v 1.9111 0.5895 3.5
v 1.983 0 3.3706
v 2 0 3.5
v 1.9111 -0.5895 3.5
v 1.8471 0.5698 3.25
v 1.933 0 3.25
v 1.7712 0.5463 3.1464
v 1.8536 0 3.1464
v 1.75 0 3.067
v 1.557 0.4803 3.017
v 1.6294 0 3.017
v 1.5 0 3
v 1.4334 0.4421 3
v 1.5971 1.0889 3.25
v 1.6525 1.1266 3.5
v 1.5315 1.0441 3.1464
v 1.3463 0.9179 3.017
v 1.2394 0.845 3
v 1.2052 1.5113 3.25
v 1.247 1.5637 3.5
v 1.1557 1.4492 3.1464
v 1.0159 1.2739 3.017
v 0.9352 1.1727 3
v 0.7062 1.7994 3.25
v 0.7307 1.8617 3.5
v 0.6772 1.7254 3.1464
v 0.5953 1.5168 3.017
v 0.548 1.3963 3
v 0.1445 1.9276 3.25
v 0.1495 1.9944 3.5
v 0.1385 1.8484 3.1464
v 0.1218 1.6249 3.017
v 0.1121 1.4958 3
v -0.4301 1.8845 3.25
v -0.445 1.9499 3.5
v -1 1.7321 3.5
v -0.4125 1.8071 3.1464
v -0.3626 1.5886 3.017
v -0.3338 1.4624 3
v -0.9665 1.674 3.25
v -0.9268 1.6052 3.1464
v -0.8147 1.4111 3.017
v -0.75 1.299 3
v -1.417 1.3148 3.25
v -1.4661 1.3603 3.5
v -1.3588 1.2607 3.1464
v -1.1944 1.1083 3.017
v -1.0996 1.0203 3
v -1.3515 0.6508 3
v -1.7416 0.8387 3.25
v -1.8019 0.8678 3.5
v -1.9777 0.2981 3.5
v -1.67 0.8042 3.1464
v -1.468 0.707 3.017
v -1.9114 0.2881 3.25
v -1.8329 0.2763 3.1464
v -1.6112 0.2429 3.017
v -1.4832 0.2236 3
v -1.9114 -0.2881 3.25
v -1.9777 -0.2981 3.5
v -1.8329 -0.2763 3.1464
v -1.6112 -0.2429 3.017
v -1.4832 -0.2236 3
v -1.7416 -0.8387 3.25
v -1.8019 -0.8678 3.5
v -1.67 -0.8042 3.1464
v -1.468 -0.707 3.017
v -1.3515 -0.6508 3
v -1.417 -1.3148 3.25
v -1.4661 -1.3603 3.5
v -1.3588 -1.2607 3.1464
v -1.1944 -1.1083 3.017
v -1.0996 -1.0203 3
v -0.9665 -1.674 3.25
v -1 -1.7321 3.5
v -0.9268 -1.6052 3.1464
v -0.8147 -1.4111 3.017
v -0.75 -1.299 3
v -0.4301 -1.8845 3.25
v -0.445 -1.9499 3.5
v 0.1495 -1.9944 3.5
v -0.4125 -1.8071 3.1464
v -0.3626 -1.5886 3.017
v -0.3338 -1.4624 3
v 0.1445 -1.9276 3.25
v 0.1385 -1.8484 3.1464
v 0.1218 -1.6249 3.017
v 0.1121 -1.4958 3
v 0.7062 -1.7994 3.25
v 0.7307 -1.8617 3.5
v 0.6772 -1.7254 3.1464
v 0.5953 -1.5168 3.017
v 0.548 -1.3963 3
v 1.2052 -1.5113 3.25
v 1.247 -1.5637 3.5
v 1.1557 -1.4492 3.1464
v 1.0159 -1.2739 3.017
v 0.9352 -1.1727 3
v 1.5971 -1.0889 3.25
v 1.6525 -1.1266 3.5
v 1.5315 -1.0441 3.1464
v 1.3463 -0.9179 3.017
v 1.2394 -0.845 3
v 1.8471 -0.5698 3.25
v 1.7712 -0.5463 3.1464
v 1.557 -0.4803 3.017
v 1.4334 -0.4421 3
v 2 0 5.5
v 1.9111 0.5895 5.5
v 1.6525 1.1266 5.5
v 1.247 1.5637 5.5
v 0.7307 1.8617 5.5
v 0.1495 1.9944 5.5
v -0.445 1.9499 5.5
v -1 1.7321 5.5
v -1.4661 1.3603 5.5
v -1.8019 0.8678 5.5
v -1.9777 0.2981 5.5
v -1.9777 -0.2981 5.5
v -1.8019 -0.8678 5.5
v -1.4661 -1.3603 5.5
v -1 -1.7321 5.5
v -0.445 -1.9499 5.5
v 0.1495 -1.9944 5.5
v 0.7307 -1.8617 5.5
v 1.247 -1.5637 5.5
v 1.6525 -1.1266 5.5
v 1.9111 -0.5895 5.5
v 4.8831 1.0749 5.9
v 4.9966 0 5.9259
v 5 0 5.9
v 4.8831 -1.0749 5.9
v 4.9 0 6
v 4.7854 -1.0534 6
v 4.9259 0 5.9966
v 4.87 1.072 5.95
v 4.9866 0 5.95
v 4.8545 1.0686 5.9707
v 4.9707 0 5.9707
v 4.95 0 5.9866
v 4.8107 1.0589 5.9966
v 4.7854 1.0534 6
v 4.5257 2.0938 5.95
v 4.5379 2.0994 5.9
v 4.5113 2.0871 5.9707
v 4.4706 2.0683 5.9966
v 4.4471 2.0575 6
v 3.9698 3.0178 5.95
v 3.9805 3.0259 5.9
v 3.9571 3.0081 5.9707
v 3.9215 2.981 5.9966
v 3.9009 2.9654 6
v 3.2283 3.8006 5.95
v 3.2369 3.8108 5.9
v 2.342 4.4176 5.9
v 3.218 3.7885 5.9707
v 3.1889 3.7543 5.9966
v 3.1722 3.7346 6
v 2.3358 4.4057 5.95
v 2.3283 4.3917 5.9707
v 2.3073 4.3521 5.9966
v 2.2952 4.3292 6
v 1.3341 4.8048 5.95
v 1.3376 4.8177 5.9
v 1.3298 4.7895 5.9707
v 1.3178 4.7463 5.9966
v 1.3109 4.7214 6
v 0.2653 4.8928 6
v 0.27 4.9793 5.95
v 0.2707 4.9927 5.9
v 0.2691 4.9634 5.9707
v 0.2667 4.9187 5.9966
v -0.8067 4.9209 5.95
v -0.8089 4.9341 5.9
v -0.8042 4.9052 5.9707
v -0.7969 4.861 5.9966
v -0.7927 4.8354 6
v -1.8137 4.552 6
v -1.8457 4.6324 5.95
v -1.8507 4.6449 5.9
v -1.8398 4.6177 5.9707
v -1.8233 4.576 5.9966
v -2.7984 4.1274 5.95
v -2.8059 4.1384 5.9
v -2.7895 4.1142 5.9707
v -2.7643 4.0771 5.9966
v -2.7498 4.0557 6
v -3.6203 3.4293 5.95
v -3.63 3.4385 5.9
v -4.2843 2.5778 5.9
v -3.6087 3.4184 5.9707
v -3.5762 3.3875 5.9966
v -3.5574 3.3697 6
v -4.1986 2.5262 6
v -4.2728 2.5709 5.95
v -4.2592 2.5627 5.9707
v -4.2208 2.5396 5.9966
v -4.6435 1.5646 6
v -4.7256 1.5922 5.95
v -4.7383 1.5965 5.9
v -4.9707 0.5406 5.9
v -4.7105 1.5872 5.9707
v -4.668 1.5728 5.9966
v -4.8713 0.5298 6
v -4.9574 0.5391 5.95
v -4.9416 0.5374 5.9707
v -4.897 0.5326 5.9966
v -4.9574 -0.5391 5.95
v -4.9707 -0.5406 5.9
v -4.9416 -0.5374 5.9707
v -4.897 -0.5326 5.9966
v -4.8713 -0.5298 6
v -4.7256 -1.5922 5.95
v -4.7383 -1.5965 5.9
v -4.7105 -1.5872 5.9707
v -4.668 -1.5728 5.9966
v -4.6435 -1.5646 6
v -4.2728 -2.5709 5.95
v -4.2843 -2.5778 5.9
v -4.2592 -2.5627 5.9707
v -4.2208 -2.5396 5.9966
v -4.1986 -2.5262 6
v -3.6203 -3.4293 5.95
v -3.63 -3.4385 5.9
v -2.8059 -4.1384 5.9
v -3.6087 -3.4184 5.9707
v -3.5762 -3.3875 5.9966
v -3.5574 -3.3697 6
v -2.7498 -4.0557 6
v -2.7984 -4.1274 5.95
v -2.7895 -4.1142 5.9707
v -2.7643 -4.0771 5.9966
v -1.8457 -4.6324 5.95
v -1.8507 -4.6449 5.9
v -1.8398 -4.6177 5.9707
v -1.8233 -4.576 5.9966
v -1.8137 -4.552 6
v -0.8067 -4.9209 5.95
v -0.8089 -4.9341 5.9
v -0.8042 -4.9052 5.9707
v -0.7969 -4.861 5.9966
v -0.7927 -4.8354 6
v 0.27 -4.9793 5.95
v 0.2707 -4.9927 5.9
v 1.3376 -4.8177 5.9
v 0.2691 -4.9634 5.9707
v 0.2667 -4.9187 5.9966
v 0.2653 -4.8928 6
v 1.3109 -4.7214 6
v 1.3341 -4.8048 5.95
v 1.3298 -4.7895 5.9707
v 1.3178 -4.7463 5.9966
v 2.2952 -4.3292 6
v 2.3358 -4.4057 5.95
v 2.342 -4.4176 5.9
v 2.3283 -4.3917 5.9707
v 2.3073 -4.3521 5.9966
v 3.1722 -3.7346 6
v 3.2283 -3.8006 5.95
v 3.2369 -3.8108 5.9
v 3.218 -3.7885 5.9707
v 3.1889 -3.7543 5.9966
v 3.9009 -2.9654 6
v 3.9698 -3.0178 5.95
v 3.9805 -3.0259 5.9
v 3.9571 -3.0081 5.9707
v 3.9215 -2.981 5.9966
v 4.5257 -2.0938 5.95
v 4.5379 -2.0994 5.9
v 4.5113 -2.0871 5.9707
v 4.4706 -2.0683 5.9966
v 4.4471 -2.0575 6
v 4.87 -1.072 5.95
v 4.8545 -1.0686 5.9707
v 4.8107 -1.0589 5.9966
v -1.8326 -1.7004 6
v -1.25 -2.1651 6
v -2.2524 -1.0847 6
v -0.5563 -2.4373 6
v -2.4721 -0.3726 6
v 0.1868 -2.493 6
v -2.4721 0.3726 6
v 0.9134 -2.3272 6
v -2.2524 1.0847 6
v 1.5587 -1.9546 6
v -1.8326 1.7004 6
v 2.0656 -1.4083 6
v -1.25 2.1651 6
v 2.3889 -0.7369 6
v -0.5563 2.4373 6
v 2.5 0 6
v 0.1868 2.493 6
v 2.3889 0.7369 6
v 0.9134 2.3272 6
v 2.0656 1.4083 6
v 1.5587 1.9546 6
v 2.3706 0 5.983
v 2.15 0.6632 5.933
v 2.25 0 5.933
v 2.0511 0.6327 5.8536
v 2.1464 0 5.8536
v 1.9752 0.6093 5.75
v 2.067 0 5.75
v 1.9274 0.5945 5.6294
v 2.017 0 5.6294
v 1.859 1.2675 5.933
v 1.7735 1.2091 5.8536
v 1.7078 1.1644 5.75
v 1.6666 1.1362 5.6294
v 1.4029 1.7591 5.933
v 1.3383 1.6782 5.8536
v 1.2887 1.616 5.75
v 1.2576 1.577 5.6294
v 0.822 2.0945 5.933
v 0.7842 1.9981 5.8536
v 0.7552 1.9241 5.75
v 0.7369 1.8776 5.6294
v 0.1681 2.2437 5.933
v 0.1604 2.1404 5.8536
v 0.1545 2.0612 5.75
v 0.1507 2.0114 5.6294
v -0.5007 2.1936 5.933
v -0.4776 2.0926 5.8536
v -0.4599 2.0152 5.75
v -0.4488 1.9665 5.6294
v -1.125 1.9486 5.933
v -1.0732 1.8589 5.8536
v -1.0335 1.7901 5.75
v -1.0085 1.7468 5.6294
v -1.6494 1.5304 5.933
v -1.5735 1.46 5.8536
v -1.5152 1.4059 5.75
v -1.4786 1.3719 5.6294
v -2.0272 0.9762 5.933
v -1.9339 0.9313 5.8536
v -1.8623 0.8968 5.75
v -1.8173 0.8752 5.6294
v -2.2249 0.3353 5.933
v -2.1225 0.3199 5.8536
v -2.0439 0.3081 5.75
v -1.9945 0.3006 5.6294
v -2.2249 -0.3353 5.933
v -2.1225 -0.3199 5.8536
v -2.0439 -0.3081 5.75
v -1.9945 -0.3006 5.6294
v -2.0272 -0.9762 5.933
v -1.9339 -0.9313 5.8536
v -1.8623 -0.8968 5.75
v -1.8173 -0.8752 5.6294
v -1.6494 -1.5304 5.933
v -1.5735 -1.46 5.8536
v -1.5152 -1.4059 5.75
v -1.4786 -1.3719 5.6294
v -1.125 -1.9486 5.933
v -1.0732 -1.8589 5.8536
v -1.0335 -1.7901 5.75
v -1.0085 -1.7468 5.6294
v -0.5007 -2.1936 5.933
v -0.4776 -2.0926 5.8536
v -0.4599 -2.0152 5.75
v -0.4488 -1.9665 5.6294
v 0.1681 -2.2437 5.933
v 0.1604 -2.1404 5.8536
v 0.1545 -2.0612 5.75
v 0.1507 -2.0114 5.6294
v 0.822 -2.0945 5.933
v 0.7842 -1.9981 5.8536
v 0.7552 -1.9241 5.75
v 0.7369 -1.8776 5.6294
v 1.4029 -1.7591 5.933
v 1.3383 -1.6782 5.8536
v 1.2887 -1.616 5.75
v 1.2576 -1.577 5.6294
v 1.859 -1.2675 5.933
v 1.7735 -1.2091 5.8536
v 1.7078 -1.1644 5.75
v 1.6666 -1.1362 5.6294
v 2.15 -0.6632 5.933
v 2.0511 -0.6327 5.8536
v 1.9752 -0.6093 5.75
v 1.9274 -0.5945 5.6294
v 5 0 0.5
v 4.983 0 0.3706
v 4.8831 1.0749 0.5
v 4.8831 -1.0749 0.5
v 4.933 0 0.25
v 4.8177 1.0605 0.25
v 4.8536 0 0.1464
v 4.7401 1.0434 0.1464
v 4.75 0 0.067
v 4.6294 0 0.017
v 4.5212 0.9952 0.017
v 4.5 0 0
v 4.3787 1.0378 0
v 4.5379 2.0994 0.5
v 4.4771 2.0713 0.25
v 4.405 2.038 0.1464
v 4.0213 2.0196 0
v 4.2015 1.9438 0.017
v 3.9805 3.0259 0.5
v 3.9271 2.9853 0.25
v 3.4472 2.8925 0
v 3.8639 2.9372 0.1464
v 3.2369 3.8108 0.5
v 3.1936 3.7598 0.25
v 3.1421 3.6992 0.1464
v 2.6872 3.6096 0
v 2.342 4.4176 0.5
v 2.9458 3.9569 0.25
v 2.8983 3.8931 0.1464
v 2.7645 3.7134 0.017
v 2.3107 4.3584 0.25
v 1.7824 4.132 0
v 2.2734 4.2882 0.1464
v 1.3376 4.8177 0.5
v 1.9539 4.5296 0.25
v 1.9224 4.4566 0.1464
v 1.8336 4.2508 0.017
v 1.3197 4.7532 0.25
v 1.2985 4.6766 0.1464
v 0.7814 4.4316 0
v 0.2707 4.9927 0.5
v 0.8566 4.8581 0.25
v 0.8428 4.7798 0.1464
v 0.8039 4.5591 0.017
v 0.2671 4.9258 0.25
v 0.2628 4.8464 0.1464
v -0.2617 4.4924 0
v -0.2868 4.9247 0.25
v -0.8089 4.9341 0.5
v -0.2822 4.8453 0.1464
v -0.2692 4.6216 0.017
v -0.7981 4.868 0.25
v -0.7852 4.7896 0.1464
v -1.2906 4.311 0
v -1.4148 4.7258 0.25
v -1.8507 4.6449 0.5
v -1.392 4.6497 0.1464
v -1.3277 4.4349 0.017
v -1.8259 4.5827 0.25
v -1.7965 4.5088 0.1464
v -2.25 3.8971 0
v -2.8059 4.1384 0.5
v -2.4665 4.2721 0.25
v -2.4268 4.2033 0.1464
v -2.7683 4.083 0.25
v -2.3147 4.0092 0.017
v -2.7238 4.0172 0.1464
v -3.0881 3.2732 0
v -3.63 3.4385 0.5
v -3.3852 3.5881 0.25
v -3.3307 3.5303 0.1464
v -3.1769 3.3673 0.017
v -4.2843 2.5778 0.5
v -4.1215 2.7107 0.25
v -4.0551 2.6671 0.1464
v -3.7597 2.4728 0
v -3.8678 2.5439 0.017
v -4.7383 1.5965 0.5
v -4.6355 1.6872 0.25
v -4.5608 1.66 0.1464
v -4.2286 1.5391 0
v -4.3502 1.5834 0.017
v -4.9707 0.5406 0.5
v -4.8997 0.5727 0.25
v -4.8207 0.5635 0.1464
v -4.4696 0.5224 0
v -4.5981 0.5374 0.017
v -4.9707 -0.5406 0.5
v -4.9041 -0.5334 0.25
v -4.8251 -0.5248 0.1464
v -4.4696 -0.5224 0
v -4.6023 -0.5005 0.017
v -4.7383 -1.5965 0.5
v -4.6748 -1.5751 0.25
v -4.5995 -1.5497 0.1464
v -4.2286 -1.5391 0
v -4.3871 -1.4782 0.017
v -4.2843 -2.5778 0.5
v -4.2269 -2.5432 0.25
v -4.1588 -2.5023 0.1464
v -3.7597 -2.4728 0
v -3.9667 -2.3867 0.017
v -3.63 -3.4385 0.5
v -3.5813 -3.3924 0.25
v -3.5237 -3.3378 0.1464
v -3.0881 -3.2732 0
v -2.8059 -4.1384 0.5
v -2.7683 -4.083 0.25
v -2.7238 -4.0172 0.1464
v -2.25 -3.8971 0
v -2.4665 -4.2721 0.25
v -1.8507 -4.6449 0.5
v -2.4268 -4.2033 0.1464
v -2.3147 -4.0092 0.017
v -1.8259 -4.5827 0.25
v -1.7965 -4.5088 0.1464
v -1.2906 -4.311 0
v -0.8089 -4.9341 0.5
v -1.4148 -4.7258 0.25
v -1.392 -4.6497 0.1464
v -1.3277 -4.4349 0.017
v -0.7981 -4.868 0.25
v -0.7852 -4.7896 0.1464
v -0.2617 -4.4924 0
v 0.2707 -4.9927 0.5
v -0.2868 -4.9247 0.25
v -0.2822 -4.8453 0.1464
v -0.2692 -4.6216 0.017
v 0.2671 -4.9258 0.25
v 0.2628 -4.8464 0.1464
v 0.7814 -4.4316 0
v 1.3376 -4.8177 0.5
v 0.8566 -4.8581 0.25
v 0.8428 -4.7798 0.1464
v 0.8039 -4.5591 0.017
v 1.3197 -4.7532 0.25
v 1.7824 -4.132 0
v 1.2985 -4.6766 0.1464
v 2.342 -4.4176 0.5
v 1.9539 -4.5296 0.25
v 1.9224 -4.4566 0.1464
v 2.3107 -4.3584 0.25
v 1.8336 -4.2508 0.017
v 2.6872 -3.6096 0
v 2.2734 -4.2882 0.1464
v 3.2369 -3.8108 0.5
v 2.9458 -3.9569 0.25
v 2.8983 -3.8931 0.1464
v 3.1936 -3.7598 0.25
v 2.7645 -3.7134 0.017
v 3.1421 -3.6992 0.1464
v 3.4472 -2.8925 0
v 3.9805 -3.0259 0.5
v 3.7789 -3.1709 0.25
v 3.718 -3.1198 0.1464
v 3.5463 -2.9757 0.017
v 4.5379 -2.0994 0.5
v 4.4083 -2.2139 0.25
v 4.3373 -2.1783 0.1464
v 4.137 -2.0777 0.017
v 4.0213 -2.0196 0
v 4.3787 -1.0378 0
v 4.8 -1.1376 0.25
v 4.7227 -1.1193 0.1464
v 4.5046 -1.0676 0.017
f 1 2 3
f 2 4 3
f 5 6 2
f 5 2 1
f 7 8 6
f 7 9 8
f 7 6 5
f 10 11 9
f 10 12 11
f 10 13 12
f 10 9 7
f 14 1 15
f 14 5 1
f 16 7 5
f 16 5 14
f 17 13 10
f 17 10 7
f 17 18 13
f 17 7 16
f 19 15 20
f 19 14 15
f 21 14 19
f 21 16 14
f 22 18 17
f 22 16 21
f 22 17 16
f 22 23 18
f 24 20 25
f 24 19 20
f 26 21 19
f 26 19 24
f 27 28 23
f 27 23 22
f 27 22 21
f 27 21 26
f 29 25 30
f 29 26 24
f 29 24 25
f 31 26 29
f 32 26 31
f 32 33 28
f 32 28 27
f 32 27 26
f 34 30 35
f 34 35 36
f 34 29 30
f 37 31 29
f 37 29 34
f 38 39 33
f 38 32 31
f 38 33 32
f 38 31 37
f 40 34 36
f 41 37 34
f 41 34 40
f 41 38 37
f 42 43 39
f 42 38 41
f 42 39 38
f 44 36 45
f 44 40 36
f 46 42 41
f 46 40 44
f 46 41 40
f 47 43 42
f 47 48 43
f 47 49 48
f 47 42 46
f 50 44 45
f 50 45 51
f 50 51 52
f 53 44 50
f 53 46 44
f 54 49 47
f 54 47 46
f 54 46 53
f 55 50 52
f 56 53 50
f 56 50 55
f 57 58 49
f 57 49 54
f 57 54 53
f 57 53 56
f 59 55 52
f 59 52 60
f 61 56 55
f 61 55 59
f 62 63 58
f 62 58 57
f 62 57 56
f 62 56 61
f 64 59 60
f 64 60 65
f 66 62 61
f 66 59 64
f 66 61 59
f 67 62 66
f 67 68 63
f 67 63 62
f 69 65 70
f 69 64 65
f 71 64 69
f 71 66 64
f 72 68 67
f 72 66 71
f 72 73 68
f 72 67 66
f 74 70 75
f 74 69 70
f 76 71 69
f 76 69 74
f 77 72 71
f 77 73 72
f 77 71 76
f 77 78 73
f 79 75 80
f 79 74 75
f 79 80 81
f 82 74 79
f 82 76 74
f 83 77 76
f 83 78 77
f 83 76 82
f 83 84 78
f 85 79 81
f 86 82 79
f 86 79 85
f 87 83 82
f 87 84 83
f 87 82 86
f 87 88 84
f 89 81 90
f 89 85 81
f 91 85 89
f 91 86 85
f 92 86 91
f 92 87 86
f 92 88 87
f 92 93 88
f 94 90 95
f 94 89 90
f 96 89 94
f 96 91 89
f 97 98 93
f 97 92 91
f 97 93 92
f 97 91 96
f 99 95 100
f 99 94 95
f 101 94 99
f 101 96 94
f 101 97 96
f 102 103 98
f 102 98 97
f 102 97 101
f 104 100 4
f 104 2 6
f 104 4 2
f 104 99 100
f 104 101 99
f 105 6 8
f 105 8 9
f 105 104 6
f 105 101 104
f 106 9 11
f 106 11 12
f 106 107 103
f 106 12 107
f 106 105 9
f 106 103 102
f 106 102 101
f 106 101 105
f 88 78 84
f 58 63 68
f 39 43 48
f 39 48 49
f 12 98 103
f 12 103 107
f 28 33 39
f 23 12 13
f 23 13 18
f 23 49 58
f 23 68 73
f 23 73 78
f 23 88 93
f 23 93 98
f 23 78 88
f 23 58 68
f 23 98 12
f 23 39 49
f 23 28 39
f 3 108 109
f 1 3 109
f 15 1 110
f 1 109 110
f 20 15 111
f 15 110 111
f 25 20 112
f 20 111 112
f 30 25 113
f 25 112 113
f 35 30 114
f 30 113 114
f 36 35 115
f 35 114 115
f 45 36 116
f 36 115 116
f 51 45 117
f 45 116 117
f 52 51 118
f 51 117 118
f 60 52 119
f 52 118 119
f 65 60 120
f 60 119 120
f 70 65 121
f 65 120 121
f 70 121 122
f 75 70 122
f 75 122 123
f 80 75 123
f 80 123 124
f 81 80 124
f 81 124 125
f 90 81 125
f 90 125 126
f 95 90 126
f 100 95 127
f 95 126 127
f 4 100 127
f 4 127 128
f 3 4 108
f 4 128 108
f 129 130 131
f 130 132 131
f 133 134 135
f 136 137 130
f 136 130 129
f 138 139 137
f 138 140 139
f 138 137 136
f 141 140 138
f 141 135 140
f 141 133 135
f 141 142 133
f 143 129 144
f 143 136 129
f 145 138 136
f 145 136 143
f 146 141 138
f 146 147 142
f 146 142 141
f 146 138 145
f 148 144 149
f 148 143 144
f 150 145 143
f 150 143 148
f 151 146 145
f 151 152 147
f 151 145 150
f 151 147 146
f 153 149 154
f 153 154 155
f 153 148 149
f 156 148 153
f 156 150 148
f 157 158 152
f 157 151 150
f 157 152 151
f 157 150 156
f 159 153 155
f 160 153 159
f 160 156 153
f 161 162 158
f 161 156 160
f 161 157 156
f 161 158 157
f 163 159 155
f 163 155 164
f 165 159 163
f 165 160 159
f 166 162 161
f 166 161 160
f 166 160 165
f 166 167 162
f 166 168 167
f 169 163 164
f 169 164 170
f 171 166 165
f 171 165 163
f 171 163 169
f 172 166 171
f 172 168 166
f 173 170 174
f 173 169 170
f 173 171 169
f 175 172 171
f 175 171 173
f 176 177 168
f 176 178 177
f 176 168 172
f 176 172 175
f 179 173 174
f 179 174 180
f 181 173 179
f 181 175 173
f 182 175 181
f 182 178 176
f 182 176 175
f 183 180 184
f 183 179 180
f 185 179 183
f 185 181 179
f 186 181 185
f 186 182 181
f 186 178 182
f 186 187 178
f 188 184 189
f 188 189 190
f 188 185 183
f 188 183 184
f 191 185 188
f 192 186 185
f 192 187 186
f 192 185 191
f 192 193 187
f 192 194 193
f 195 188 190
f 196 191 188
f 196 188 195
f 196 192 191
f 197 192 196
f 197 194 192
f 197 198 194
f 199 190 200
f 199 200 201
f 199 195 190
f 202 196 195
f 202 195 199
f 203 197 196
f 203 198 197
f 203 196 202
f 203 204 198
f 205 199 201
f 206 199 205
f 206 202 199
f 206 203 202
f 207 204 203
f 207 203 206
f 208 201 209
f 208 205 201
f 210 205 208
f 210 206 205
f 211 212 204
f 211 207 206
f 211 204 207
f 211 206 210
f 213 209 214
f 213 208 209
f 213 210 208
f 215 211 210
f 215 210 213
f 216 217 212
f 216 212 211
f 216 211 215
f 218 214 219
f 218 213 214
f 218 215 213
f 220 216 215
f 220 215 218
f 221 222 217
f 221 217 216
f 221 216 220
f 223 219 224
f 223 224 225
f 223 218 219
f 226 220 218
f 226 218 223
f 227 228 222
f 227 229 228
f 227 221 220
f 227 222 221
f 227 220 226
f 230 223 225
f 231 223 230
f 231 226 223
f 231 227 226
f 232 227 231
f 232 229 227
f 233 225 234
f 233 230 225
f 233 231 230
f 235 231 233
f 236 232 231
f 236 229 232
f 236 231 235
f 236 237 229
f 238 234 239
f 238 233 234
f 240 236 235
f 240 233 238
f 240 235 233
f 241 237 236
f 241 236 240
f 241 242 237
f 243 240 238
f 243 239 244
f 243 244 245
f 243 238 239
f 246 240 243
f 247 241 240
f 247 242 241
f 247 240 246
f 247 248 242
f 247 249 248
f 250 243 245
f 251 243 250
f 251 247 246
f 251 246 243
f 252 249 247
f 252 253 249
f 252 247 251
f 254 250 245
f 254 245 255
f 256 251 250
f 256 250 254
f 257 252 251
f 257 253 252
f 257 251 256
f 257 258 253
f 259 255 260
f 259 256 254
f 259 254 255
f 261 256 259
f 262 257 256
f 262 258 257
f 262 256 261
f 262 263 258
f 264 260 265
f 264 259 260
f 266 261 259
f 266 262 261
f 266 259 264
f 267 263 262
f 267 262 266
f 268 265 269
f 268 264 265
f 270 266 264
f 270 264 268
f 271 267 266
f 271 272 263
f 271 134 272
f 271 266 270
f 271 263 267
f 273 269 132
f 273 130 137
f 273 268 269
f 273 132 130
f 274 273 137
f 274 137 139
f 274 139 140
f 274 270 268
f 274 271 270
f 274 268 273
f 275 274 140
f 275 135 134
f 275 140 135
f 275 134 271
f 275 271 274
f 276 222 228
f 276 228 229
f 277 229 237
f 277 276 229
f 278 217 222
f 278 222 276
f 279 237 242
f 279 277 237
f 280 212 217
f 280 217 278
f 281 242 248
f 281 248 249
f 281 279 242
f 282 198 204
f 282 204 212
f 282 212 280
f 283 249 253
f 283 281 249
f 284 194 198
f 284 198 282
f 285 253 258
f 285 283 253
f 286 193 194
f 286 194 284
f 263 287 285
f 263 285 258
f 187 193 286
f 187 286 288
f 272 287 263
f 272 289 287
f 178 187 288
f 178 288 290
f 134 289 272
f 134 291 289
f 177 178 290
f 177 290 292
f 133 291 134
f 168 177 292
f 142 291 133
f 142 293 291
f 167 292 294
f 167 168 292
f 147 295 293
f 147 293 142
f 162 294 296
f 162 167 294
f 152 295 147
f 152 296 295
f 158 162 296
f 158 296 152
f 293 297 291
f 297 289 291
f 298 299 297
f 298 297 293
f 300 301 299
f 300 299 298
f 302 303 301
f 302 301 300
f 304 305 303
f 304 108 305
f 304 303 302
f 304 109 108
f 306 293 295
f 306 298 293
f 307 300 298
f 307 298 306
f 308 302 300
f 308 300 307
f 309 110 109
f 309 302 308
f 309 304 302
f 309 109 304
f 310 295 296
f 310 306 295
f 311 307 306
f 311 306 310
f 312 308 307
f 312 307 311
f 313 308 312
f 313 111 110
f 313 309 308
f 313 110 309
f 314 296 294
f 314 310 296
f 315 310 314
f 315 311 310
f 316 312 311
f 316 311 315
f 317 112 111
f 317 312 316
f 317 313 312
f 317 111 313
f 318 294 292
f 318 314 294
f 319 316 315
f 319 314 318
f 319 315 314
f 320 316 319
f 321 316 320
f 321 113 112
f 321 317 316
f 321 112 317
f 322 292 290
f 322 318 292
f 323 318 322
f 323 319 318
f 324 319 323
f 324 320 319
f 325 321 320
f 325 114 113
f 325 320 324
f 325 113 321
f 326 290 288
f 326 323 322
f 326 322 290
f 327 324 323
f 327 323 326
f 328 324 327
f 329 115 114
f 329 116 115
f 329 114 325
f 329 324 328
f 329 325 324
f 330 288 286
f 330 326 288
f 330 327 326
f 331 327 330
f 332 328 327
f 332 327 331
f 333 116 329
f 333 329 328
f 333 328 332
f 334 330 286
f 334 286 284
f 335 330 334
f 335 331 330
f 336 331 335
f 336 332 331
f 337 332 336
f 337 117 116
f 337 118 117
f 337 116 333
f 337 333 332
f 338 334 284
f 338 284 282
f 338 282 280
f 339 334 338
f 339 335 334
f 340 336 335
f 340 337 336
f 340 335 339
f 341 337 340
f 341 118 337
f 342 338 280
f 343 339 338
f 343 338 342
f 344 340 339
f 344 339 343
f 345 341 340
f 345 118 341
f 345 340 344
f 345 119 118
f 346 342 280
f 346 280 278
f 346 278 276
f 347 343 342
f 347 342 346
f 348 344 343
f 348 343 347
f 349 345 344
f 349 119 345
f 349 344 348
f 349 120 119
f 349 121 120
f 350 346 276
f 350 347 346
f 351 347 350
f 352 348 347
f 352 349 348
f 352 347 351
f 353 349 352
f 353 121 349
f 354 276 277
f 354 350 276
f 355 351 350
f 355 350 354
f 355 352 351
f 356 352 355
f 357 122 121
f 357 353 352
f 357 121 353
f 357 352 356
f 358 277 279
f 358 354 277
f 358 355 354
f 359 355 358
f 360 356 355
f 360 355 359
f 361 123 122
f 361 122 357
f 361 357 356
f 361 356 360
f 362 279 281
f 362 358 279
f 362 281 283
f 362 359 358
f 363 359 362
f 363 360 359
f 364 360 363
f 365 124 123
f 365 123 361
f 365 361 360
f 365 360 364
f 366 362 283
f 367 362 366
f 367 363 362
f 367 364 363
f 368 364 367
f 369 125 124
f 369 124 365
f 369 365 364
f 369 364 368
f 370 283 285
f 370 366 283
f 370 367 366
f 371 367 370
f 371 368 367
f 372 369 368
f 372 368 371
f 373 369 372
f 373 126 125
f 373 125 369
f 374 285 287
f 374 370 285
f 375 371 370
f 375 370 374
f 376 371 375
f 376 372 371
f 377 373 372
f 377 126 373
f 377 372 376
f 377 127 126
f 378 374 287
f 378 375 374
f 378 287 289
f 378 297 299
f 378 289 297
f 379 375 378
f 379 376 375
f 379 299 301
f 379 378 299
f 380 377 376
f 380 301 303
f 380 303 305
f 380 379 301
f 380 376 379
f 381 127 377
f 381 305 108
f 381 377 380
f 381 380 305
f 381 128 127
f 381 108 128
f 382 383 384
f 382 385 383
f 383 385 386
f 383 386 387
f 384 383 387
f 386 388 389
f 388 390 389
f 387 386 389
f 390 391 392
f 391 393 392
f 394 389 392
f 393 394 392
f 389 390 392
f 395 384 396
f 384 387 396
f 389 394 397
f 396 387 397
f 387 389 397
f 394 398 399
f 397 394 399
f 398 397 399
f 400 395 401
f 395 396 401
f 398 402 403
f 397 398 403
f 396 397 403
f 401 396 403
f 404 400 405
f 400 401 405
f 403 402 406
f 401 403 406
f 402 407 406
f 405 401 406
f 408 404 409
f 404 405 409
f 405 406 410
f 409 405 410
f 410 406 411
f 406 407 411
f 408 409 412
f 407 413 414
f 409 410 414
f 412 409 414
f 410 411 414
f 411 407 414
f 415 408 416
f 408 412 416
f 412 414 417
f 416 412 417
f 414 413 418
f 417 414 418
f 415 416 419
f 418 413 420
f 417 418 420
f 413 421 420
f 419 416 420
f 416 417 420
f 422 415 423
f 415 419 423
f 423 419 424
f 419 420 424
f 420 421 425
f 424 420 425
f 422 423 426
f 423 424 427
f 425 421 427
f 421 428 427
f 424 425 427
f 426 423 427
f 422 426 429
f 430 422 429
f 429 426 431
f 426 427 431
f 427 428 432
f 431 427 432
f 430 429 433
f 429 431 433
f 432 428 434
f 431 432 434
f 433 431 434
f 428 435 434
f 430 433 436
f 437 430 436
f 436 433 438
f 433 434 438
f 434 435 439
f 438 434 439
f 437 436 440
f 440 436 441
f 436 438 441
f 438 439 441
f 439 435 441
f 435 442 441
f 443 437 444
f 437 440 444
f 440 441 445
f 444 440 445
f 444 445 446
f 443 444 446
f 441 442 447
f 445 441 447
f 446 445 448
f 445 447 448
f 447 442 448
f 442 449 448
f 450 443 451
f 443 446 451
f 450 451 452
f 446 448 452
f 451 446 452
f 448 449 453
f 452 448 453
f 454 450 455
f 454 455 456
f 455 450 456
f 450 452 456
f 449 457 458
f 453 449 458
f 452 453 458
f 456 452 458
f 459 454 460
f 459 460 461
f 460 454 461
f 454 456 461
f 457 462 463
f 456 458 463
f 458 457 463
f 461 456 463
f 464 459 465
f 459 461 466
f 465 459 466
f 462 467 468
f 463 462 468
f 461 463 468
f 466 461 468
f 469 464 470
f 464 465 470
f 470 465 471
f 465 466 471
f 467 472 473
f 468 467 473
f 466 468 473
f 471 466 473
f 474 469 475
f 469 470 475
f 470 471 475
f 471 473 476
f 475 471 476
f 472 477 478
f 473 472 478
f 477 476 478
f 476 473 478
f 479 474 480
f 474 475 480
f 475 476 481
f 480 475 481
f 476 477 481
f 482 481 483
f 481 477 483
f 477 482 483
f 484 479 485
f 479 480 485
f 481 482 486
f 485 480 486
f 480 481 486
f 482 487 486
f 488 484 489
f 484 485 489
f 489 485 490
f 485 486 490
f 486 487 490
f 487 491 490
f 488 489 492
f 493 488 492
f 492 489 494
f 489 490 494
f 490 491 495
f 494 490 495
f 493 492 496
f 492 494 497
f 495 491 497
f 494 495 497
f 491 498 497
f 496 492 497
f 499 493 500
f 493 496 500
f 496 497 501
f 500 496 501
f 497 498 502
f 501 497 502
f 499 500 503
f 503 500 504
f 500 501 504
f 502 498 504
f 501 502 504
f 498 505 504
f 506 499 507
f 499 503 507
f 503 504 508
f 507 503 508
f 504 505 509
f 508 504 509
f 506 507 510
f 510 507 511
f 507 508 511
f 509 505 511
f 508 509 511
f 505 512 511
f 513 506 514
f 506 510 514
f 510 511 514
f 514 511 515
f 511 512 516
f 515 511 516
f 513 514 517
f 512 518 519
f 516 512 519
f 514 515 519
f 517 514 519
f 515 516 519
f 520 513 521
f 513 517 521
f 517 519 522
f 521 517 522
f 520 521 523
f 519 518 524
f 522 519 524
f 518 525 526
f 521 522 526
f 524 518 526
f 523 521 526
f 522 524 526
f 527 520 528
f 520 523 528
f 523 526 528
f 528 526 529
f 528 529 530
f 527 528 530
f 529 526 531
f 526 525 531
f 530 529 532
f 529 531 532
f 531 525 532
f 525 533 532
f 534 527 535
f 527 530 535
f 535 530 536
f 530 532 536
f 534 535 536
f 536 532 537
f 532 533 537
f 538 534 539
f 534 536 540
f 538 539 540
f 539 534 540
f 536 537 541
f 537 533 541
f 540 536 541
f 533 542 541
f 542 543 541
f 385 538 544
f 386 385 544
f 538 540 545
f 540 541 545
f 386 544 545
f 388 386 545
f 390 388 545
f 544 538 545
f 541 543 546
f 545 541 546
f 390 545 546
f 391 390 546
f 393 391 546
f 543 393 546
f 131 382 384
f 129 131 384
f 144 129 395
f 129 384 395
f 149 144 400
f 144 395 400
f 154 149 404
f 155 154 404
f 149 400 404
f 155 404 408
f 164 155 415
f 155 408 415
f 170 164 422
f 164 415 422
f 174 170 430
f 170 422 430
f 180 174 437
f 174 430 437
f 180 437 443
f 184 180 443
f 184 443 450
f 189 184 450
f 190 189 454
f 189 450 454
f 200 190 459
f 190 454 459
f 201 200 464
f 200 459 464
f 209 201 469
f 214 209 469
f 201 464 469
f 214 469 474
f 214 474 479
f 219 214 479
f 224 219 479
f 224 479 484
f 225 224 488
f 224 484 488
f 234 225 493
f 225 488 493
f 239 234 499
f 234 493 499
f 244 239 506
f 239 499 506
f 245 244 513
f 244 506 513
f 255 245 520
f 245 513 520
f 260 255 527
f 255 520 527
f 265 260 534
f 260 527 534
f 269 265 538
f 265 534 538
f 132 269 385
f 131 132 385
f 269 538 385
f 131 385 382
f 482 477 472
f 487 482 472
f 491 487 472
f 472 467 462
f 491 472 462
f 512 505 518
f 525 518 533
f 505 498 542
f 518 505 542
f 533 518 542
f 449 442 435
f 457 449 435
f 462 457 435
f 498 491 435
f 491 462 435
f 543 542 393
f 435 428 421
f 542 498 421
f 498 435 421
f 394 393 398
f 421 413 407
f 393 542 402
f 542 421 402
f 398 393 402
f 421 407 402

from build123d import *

# Parameters (mm, degrees)
SCHIZZO1_R                   = 5
ESTRUSIONE_ESTRUSIONE1_DEPTH = 6
SCHIZZO2_R                   = 2
TAGLIO_ESTRUSIONE1_DEPTH     = 3
RACCORDO1_R                  = 0.5
RACCORDO2_R                  = 0.1


with BuildPart() as part:
    # Schizzo1 → Estrusione-Estrusione1 (new body)
    with BuildSketch(Plane.XY):
        Circle(SCHIZZO1_R)
    extrude(amount=ESTRUSIONE_ESTRUSIONE1_DEPTH)

    # Schizzo2 → Taglio-Estrusione1 (cut)
    with BuildSketch(Plane.XY.offset(6)):
        Circle(SCHIZZO2_R)
    extrude(amount=-TAGLIO_ESTRUSIONE1_DEPTH, mode=Mode.SUBTRACT)

    # Raccordo1
    raccordo1_edges = [part.edges().sort_by_distance(p)[0] for p in [
        (-5, 0, 0),
        (-2, 0, 3),
        (-2, 0, 6),
    ]]
    fillet(raccordo1_edges, radius=RACCORDO1_R)

    # Raccordo2
    raccordo2_edges = [part.edges().sort_by_distance(p)[0] for p in [
        (-5, 0, 6),
    ]]
    fillet(raccordo2_edges, radius=RACCORDO2_R)


solid = part.part
